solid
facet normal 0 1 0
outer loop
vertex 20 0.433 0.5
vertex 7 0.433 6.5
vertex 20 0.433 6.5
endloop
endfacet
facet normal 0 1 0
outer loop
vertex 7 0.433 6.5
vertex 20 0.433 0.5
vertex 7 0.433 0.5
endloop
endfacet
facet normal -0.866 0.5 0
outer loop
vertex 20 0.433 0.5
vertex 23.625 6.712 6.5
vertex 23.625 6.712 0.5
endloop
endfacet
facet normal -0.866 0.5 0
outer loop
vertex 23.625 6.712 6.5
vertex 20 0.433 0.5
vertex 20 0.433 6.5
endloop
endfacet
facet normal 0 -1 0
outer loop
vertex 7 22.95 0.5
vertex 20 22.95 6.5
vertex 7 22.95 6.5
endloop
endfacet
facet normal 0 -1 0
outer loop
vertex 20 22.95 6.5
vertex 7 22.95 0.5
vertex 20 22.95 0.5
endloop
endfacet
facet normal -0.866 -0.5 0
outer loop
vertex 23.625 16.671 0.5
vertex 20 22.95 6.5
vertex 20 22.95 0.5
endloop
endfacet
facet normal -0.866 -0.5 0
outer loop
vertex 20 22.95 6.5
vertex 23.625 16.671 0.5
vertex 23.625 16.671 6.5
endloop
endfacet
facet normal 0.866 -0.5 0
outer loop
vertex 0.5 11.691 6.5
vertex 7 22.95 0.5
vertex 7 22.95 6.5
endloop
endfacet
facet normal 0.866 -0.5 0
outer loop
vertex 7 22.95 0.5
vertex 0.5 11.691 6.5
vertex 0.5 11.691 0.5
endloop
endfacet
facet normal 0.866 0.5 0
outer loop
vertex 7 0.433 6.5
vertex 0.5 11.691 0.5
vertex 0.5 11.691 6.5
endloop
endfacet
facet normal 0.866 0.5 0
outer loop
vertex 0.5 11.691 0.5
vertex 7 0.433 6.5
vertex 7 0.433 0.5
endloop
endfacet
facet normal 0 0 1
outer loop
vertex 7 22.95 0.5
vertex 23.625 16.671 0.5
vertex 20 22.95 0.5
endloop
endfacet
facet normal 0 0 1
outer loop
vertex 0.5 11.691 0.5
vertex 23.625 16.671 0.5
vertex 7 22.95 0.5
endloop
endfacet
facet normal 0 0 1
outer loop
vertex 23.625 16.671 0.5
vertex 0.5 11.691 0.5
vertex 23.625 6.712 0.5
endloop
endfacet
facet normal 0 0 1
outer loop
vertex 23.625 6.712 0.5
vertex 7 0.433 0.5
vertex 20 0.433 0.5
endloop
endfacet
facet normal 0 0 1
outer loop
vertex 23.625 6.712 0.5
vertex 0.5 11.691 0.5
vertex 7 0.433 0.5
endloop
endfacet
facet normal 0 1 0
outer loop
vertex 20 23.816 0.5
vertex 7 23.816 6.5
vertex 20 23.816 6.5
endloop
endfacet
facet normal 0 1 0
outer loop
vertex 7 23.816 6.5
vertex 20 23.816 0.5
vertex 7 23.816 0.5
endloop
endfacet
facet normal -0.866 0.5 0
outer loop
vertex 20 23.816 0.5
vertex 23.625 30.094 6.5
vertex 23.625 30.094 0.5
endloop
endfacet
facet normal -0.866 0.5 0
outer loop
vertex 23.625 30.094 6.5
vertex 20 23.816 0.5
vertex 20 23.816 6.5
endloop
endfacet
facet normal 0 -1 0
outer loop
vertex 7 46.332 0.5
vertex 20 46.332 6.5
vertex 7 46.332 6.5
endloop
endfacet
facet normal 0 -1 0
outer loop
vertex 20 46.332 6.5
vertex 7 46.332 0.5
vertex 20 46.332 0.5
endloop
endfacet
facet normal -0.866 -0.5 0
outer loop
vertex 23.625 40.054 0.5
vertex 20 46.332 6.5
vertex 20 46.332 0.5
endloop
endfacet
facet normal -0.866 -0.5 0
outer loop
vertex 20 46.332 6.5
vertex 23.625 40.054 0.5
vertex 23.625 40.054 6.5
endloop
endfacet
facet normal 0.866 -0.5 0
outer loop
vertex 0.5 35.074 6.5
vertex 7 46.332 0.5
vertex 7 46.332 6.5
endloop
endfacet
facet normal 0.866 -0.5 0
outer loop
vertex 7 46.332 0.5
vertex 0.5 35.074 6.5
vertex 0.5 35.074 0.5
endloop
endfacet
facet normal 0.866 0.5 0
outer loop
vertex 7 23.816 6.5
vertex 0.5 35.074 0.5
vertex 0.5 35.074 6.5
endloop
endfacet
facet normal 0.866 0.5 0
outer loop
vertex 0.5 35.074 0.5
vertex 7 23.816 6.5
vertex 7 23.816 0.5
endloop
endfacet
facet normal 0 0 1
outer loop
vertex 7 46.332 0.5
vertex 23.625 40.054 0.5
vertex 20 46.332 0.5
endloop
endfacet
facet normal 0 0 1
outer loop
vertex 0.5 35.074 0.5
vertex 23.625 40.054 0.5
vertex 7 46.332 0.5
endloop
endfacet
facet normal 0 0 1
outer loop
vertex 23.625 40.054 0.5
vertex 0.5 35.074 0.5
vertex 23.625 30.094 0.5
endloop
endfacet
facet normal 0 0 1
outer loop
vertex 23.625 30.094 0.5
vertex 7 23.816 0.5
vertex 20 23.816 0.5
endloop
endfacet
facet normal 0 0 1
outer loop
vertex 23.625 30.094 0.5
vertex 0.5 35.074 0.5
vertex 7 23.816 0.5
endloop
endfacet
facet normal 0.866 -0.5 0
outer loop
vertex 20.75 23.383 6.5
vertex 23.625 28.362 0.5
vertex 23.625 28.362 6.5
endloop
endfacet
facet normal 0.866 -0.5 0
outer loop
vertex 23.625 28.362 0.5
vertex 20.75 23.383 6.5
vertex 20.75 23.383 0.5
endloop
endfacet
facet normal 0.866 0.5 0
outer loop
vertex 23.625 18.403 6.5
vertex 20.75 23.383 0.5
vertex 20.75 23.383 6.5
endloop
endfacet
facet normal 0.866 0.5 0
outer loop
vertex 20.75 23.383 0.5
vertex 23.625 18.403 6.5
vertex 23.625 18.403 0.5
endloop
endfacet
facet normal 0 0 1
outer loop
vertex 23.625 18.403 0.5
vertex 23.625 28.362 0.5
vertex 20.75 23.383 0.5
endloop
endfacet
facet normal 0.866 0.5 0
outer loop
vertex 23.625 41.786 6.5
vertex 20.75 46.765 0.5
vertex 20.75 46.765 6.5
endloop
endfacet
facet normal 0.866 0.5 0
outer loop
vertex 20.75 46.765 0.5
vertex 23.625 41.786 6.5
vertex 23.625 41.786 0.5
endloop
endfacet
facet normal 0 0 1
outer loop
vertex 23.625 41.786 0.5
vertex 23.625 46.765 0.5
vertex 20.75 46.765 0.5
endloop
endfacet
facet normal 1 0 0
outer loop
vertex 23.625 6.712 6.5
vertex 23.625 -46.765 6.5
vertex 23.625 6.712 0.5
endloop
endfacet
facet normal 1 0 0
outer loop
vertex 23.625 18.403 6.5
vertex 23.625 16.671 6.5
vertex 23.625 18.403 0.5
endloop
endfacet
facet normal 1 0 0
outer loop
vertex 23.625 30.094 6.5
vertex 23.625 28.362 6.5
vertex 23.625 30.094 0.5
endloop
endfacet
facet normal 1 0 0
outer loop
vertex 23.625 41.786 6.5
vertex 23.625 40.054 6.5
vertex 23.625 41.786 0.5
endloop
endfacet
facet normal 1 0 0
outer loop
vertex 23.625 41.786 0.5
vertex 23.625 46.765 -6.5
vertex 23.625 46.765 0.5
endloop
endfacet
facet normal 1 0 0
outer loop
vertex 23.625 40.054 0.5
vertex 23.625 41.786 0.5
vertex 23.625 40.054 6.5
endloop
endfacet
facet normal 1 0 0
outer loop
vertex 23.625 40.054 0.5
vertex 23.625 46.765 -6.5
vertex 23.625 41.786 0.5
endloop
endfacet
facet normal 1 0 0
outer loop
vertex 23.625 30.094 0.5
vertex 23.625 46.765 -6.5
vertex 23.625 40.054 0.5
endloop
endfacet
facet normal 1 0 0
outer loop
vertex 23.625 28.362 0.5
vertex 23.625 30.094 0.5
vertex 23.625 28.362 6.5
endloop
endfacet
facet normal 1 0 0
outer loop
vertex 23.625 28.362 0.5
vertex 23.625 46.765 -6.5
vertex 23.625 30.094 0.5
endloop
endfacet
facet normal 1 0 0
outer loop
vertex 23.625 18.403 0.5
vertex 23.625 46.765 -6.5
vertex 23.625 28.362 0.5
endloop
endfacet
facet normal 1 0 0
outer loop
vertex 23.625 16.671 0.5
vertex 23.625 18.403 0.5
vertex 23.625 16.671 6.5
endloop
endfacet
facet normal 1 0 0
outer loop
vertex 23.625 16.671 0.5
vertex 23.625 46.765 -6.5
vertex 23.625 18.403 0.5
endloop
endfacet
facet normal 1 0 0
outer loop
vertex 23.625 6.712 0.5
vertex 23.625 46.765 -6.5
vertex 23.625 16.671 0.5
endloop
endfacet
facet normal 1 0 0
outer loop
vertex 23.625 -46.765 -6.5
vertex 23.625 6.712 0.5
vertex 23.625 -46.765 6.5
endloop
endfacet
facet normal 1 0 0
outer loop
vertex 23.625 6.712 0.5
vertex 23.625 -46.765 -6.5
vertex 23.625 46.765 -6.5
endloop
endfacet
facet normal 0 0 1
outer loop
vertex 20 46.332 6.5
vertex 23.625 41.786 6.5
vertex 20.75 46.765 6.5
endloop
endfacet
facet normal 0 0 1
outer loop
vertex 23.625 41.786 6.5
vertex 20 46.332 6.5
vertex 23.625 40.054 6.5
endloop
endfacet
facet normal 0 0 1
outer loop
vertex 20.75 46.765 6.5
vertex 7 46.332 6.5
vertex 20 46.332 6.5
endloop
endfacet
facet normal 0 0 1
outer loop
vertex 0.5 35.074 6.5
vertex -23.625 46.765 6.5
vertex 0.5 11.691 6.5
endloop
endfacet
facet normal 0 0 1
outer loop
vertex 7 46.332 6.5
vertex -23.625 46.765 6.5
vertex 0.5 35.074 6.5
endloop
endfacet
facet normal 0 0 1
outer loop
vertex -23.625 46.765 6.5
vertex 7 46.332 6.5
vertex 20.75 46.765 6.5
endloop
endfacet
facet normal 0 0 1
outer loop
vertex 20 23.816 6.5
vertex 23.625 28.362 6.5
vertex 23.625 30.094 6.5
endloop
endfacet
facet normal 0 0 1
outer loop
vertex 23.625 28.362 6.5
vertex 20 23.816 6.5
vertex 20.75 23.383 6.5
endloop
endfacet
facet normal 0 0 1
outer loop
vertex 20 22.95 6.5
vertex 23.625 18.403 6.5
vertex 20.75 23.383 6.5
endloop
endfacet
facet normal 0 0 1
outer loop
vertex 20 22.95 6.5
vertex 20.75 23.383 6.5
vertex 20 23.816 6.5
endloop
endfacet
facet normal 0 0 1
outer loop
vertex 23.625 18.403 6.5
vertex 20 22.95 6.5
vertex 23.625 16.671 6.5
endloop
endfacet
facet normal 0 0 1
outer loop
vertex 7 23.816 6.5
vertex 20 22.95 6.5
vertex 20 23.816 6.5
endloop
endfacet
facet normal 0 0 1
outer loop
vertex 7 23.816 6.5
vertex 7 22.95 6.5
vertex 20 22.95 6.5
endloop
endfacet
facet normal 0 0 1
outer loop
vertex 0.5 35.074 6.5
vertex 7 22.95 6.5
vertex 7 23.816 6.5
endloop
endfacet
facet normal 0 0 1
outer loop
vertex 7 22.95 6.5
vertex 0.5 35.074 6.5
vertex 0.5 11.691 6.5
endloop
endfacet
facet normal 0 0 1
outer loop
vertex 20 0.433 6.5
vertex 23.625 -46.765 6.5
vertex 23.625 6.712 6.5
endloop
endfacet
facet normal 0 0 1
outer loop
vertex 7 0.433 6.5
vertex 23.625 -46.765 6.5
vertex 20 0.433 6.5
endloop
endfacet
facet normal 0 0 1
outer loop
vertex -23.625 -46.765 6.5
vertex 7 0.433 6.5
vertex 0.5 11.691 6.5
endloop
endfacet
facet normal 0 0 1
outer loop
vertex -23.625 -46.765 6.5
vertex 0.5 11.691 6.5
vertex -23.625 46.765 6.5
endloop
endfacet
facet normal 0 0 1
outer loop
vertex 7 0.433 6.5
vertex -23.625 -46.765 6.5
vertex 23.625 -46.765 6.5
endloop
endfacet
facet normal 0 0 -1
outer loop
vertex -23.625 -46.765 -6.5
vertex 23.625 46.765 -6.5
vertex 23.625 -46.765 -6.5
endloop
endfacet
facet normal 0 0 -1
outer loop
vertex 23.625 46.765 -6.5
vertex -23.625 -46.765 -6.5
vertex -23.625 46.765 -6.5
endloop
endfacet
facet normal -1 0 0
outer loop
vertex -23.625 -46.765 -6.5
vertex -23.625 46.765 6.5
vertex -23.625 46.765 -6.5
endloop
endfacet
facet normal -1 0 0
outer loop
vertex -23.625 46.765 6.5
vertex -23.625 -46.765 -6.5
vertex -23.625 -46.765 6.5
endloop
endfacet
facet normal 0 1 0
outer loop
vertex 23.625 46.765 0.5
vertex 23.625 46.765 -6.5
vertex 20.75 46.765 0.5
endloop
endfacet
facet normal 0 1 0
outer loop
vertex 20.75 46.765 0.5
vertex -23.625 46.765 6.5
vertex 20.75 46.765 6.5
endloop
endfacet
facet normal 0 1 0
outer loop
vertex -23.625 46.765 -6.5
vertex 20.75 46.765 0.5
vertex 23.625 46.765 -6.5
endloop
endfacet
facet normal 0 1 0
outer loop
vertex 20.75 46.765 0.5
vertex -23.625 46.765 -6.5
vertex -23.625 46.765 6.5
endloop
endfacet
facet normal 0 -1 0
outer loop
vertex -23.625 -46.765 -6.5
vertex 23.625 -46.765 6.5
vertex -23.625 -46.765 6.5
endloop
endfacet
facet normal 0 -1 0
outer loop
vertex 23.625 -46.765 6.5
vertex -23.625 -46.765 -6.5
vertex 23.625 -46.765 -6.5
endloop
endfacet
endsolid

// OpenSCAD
// file: BOSL2/std.scad
// Minimal BOSL2 compatibility shim for bundled gallery models.
// It implements only the helpers used by the imported OpenSCAD projects.

CENTER = [0, 0, 0];
BOTTOM = [0, 0, -1];
TOP = [0, 0, 1];
LEFT = [-1, 0, 0];
RIGHT = [1, 0, 0];
FRONT = [0, -1, 0];
BACK = [0, 1, 0];

module up(z=0) {
    translate([0, 0, z]) children();
}

module down(z=0) {
    translate([0, 0, -z]) children();
}

module attach(anchor=CENTER) {
    children();
}

module cuboid(size=[1, 1, 1], anchor=CENTER) {
    center = anchor == CENTER;
    translate(center ? [0, 0, 0] : [0, 0, size[2] / 2])
        cube(size, center=true);
    children();
}

module xcyl(h=1, r=1, anchor=CENTER) {
    center = anchor == CENTER;
    translate(center ? [0, 0, 0] : [h / 2, 0, 0])
        rotate([0, 90, 0])
            cylinder(h=h, r=r, center=true);
}
// main file
include <BOSL2/std.scad>

hexTray();

module hexTray(L=4,W=2,Z=13, hexR=13, iWallT=1,oWallT=1){
    difference(){
        X=(((W*(3/4))+0.25)*((hexR+(iWallT/2))*2));
        Y=(L*(sqrt(3)*(hexR+(iWallT/2))));
        echo("",X);
        cuboid([X,Y,Z], p1 = [0,0,0]);
        translate([(hexR+(iWallT/2)),(sqrt(3)/2)*(hexR+iWallT/2),(Z/2)+(oWallT/2)]){
            hexGrid(L,W,hexR,Z,iWallT);
        }
    }
}

module hexGrid(length, width, hexR, hexH, spacing, inverted = false){
    oHex = hexR + (spacing / 2);
    for(i = [0 : width-1]){
        if(i%2 == 1){
            translate([i * ((3/2) * oHex), (i % 2) * ((sqrt(3) * oHex) / 2), 0]){
                for(j = [0: length-2]){
                    translate([0,j*(sqrt(3) * oHex), 0]){
                        difference(){
                            if(inverted){
                                hexagon(hexH, oHex);
                            }
                            hexagon(hexH, hexR);
                        }
                    }
                }
            }
        } else {
            translate([i * ((3/2) * oHex), -(i % 2) * ((sqrt(3) * oHex) / 2), 0]){
                for(j = [0: length-1]){
                    translate([0,j*(sqrt(3) * oHex), 0]){
                        difference(){
                            if(inverted){
                                hexagon(hexH, oHex);
                            }
                            hexagon(hexH, hexR);
                        }
                    }
                }
            }
        }
    }
}

module hexagon(height, radius, center = true){
    cylinder(h = height, r = radius, center = center, $fn = 6);
}
